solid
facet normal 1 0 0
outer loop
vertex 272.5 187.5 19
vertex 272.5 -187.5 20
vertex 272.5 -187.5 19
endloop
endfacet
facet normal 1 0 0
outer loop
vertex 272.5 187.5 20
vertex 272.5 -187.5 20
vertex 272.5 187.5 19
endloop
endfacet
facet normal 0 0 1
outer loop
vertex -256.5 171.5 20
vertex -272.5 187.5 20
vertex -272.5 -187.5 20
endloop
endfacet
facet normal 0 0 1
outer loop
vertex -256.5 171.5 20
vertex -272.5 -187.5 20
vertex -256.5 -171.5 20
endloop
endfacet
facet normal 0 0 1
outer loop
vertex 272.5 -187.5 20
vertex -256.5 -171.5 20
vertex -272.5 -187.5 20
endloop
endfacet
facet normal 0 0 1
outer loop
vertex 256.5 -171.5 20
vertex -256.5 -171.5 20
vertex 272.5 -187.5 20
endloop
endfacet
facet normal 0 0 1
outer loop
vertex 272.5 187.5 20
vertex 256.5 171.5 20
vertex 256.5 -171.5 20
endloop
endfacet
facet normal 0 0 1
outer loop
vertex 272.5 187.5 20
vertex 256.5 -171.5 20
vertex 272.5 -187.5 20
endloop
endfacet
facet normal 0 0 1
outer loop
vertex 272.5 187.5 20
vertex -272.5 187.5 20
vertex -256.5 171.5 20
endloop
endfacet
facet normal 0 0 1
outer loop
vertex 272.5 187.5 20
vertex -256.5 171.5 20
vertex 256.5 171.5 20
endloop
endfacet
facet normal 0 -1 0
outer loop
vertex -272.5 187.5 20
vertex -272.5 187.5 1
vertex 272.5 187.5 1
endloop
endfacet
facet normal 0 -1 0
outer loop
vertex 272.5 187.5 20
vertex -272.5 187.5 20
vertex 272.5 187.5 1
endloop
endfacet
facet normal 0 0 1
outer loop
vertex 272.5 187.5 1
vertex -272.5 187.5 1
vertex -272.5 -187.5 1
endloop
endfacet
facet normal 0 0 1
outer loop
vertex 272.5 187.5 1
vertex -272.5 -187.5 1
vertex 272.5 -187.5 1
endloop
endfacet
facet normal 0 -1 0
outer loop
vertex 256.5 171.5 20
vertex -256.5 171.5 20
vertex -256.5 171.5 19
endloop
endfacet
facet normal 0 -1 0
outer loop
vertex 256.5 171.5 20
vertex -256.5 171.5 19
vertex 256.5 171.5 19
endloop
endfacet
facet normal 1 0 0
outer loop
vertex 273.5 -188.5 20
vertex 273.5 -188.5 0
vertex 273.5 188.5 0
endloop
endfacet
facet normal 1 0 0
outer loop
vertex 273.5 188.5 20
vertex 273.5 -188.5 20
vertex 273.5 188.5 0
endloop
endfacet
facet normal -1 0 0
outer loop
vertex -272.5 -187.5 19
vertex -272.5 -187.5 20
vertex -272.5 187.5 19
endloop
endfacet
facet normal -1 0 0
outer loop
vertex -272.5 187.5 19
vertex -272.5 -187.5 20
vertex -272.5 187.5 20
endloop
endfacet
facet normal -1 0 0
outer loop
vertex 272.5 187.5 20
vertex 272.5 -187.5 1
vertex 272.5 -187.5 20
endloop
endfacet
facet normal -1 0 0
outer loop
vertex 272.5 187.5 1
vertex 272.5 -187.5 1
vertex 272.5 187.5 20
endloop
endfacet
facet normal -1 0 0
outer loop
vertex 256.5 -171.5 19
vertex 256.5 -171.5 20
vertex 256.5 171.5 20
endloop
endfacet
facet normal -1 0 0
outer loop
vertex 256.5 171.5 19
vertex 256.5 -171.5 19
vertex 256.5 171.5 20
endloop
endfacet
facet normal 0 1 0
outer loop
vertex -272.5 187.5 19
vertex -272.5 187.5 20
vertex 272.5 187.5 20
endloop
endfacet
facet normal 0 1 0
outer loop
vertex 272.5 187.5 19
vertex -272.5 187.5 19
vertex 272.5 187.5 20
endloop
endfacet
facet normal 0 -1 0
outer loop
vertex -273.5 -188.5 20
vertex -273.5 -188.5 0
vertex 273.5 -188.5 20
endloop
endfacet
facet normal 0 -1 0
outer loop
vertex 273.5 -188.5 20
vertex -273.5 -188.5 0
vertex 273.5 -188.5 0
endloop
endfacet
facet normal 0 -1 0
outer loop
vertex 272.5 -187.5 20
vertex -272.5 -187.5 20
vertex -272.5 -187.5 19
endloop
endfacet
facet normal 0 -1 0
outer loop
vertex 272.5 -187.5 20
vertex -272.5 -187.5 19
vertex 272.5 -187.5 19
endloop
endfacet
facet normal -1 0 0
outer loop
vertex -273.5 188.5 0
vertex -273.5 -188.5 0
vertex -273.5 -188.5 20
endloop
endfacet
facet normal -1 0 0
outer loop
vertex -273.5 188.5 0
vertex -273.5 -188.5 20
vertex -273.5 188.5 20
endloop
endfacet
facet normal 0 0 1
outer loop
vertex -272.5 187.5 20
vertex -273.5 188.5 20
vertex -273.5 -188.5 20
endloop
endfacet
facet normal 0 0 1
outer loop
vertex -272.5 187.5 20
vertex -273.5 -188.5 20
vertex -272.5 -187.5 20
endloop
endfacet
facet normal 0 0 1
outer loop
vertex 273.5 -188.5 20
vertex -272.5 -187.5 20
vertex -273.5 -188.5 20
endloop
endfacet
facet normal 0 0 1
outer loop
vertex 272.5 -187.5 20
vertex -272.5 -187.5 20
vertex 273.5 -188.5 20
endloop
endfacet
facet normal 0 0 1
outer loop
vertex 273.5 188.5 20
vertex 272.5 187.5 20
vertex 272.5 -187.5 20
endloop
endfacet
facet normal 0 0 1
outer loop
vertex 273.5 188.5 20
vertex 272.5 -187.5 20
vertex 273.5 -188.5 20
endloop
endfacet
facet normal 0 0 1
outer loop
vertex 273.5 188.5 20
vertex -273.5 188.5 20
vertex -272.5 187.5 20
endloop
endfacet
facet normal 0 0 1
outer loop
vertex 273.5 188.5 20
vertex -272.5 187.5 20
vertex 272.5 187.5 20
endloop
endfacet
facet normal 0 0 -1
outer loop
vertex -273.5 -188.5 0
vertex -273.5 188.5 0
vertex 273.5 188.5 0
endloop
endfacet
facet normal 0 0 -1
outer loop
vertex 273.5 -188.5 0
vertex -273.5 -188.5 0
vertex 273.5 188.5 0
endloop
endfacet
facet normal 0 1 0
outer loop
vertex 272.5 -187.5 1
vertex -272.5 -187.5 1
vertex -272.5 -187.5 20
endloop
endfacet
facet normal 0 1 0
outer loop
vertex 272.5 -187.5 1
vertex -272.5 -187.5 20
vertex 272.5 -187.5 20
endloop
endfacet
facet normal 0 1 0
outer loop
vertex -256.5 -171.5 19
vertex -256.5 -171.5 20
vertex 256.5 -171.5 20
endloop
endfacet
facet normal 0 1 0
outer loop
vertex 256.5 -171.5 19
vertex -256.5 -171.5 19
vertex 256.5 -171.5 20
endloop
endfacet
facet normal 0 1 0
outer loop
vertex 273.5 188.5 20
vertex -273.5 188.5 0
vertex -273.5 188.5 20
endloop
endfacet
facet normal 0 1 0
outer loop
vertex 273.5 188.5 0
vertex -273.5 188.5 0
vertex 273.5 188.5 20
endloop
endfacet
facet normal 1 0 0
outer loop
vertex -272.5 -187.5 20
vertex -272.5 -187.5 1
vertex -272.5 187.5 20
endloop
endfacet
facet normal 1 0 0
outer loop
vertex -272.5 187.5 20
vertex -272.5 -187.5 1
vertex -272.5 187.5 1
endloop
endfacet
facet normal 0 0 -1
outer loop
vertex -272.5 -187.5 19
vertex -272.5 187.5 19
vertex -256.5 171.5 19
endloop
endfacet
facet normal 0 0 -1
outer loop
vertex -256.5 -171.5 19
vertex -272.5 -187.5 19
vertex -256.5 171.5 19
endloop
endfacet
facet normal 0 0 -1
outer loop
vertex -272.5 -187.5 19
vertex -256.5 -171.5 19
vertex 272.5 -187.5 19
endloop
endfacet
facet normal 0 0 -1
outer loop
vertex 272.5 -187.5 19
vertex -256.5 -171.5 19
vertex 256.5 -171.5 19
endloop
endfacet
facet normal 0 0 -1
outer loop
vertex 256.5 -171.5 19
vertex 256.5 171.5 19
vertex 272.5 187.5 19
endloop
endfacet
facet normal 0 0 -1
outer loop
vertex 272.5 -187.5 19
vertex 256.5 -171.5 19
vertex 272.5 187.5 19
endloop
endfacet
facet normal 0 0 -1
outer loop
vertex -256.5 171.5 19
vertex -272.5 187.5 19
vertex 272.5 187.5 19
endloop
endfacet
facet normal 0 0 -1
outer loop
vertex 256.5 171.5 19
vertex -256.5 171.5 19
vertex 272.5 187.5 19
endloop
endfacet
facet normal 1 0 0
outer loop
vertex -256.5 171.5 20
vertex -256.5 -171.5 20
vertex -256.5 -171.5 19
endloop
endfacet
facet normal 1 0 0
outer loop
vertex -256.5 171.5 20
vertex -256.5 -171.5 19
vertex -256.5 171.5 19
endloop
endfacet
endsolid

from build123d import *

# Parameters (mm, degrees)
SKETCH_1_W      = 547
SKETCH_1_H      = 377
EXTRUDE_1_DEPTH = 20
SHELL_1_T       = -1
SKETCH_3_W      = 545
SKETCH_3_H      = 375
SKETCH_3_W_2    = 513
SKETCH_3_H_2    = 343
EXTRUDE_2_DEPTH = 1


with BuildPart() as part:
    # 草图1 → 凸台-拉伸1 (new body)
    with BuildSketch(Plane.XY):
        Rectangle(SKETCH_1_W, SKETCH_1_H)
    extrude(amount=EXTRUDE_1_DEPTH)

    # 抽壳1
    shell_1_openings = [part.faces().sort_by_distance(p)[0] for p in [
        (0, 0, 20),
    ]]
    offset(amount=SHELL_1_T, openings=shell_1_openings, kind=Kind.INTERSECTION)


with BuildPart() as body_2:
    # 草图3 → 凸台-拉伸2 (new body)
    with BuildSketch(Plane.XY.offset(20)):
        Rectangle(SKETCH_3_W, SKETCH_3_H)
        Rectangle(SKETCH_3_W_2, SKETCH_3_H_2, mode=Mode.SUBTRACT)
    extrude(amount=-EXTRUDE_2_DEPTH)


solid = Compound([part.part, body_2.part])
